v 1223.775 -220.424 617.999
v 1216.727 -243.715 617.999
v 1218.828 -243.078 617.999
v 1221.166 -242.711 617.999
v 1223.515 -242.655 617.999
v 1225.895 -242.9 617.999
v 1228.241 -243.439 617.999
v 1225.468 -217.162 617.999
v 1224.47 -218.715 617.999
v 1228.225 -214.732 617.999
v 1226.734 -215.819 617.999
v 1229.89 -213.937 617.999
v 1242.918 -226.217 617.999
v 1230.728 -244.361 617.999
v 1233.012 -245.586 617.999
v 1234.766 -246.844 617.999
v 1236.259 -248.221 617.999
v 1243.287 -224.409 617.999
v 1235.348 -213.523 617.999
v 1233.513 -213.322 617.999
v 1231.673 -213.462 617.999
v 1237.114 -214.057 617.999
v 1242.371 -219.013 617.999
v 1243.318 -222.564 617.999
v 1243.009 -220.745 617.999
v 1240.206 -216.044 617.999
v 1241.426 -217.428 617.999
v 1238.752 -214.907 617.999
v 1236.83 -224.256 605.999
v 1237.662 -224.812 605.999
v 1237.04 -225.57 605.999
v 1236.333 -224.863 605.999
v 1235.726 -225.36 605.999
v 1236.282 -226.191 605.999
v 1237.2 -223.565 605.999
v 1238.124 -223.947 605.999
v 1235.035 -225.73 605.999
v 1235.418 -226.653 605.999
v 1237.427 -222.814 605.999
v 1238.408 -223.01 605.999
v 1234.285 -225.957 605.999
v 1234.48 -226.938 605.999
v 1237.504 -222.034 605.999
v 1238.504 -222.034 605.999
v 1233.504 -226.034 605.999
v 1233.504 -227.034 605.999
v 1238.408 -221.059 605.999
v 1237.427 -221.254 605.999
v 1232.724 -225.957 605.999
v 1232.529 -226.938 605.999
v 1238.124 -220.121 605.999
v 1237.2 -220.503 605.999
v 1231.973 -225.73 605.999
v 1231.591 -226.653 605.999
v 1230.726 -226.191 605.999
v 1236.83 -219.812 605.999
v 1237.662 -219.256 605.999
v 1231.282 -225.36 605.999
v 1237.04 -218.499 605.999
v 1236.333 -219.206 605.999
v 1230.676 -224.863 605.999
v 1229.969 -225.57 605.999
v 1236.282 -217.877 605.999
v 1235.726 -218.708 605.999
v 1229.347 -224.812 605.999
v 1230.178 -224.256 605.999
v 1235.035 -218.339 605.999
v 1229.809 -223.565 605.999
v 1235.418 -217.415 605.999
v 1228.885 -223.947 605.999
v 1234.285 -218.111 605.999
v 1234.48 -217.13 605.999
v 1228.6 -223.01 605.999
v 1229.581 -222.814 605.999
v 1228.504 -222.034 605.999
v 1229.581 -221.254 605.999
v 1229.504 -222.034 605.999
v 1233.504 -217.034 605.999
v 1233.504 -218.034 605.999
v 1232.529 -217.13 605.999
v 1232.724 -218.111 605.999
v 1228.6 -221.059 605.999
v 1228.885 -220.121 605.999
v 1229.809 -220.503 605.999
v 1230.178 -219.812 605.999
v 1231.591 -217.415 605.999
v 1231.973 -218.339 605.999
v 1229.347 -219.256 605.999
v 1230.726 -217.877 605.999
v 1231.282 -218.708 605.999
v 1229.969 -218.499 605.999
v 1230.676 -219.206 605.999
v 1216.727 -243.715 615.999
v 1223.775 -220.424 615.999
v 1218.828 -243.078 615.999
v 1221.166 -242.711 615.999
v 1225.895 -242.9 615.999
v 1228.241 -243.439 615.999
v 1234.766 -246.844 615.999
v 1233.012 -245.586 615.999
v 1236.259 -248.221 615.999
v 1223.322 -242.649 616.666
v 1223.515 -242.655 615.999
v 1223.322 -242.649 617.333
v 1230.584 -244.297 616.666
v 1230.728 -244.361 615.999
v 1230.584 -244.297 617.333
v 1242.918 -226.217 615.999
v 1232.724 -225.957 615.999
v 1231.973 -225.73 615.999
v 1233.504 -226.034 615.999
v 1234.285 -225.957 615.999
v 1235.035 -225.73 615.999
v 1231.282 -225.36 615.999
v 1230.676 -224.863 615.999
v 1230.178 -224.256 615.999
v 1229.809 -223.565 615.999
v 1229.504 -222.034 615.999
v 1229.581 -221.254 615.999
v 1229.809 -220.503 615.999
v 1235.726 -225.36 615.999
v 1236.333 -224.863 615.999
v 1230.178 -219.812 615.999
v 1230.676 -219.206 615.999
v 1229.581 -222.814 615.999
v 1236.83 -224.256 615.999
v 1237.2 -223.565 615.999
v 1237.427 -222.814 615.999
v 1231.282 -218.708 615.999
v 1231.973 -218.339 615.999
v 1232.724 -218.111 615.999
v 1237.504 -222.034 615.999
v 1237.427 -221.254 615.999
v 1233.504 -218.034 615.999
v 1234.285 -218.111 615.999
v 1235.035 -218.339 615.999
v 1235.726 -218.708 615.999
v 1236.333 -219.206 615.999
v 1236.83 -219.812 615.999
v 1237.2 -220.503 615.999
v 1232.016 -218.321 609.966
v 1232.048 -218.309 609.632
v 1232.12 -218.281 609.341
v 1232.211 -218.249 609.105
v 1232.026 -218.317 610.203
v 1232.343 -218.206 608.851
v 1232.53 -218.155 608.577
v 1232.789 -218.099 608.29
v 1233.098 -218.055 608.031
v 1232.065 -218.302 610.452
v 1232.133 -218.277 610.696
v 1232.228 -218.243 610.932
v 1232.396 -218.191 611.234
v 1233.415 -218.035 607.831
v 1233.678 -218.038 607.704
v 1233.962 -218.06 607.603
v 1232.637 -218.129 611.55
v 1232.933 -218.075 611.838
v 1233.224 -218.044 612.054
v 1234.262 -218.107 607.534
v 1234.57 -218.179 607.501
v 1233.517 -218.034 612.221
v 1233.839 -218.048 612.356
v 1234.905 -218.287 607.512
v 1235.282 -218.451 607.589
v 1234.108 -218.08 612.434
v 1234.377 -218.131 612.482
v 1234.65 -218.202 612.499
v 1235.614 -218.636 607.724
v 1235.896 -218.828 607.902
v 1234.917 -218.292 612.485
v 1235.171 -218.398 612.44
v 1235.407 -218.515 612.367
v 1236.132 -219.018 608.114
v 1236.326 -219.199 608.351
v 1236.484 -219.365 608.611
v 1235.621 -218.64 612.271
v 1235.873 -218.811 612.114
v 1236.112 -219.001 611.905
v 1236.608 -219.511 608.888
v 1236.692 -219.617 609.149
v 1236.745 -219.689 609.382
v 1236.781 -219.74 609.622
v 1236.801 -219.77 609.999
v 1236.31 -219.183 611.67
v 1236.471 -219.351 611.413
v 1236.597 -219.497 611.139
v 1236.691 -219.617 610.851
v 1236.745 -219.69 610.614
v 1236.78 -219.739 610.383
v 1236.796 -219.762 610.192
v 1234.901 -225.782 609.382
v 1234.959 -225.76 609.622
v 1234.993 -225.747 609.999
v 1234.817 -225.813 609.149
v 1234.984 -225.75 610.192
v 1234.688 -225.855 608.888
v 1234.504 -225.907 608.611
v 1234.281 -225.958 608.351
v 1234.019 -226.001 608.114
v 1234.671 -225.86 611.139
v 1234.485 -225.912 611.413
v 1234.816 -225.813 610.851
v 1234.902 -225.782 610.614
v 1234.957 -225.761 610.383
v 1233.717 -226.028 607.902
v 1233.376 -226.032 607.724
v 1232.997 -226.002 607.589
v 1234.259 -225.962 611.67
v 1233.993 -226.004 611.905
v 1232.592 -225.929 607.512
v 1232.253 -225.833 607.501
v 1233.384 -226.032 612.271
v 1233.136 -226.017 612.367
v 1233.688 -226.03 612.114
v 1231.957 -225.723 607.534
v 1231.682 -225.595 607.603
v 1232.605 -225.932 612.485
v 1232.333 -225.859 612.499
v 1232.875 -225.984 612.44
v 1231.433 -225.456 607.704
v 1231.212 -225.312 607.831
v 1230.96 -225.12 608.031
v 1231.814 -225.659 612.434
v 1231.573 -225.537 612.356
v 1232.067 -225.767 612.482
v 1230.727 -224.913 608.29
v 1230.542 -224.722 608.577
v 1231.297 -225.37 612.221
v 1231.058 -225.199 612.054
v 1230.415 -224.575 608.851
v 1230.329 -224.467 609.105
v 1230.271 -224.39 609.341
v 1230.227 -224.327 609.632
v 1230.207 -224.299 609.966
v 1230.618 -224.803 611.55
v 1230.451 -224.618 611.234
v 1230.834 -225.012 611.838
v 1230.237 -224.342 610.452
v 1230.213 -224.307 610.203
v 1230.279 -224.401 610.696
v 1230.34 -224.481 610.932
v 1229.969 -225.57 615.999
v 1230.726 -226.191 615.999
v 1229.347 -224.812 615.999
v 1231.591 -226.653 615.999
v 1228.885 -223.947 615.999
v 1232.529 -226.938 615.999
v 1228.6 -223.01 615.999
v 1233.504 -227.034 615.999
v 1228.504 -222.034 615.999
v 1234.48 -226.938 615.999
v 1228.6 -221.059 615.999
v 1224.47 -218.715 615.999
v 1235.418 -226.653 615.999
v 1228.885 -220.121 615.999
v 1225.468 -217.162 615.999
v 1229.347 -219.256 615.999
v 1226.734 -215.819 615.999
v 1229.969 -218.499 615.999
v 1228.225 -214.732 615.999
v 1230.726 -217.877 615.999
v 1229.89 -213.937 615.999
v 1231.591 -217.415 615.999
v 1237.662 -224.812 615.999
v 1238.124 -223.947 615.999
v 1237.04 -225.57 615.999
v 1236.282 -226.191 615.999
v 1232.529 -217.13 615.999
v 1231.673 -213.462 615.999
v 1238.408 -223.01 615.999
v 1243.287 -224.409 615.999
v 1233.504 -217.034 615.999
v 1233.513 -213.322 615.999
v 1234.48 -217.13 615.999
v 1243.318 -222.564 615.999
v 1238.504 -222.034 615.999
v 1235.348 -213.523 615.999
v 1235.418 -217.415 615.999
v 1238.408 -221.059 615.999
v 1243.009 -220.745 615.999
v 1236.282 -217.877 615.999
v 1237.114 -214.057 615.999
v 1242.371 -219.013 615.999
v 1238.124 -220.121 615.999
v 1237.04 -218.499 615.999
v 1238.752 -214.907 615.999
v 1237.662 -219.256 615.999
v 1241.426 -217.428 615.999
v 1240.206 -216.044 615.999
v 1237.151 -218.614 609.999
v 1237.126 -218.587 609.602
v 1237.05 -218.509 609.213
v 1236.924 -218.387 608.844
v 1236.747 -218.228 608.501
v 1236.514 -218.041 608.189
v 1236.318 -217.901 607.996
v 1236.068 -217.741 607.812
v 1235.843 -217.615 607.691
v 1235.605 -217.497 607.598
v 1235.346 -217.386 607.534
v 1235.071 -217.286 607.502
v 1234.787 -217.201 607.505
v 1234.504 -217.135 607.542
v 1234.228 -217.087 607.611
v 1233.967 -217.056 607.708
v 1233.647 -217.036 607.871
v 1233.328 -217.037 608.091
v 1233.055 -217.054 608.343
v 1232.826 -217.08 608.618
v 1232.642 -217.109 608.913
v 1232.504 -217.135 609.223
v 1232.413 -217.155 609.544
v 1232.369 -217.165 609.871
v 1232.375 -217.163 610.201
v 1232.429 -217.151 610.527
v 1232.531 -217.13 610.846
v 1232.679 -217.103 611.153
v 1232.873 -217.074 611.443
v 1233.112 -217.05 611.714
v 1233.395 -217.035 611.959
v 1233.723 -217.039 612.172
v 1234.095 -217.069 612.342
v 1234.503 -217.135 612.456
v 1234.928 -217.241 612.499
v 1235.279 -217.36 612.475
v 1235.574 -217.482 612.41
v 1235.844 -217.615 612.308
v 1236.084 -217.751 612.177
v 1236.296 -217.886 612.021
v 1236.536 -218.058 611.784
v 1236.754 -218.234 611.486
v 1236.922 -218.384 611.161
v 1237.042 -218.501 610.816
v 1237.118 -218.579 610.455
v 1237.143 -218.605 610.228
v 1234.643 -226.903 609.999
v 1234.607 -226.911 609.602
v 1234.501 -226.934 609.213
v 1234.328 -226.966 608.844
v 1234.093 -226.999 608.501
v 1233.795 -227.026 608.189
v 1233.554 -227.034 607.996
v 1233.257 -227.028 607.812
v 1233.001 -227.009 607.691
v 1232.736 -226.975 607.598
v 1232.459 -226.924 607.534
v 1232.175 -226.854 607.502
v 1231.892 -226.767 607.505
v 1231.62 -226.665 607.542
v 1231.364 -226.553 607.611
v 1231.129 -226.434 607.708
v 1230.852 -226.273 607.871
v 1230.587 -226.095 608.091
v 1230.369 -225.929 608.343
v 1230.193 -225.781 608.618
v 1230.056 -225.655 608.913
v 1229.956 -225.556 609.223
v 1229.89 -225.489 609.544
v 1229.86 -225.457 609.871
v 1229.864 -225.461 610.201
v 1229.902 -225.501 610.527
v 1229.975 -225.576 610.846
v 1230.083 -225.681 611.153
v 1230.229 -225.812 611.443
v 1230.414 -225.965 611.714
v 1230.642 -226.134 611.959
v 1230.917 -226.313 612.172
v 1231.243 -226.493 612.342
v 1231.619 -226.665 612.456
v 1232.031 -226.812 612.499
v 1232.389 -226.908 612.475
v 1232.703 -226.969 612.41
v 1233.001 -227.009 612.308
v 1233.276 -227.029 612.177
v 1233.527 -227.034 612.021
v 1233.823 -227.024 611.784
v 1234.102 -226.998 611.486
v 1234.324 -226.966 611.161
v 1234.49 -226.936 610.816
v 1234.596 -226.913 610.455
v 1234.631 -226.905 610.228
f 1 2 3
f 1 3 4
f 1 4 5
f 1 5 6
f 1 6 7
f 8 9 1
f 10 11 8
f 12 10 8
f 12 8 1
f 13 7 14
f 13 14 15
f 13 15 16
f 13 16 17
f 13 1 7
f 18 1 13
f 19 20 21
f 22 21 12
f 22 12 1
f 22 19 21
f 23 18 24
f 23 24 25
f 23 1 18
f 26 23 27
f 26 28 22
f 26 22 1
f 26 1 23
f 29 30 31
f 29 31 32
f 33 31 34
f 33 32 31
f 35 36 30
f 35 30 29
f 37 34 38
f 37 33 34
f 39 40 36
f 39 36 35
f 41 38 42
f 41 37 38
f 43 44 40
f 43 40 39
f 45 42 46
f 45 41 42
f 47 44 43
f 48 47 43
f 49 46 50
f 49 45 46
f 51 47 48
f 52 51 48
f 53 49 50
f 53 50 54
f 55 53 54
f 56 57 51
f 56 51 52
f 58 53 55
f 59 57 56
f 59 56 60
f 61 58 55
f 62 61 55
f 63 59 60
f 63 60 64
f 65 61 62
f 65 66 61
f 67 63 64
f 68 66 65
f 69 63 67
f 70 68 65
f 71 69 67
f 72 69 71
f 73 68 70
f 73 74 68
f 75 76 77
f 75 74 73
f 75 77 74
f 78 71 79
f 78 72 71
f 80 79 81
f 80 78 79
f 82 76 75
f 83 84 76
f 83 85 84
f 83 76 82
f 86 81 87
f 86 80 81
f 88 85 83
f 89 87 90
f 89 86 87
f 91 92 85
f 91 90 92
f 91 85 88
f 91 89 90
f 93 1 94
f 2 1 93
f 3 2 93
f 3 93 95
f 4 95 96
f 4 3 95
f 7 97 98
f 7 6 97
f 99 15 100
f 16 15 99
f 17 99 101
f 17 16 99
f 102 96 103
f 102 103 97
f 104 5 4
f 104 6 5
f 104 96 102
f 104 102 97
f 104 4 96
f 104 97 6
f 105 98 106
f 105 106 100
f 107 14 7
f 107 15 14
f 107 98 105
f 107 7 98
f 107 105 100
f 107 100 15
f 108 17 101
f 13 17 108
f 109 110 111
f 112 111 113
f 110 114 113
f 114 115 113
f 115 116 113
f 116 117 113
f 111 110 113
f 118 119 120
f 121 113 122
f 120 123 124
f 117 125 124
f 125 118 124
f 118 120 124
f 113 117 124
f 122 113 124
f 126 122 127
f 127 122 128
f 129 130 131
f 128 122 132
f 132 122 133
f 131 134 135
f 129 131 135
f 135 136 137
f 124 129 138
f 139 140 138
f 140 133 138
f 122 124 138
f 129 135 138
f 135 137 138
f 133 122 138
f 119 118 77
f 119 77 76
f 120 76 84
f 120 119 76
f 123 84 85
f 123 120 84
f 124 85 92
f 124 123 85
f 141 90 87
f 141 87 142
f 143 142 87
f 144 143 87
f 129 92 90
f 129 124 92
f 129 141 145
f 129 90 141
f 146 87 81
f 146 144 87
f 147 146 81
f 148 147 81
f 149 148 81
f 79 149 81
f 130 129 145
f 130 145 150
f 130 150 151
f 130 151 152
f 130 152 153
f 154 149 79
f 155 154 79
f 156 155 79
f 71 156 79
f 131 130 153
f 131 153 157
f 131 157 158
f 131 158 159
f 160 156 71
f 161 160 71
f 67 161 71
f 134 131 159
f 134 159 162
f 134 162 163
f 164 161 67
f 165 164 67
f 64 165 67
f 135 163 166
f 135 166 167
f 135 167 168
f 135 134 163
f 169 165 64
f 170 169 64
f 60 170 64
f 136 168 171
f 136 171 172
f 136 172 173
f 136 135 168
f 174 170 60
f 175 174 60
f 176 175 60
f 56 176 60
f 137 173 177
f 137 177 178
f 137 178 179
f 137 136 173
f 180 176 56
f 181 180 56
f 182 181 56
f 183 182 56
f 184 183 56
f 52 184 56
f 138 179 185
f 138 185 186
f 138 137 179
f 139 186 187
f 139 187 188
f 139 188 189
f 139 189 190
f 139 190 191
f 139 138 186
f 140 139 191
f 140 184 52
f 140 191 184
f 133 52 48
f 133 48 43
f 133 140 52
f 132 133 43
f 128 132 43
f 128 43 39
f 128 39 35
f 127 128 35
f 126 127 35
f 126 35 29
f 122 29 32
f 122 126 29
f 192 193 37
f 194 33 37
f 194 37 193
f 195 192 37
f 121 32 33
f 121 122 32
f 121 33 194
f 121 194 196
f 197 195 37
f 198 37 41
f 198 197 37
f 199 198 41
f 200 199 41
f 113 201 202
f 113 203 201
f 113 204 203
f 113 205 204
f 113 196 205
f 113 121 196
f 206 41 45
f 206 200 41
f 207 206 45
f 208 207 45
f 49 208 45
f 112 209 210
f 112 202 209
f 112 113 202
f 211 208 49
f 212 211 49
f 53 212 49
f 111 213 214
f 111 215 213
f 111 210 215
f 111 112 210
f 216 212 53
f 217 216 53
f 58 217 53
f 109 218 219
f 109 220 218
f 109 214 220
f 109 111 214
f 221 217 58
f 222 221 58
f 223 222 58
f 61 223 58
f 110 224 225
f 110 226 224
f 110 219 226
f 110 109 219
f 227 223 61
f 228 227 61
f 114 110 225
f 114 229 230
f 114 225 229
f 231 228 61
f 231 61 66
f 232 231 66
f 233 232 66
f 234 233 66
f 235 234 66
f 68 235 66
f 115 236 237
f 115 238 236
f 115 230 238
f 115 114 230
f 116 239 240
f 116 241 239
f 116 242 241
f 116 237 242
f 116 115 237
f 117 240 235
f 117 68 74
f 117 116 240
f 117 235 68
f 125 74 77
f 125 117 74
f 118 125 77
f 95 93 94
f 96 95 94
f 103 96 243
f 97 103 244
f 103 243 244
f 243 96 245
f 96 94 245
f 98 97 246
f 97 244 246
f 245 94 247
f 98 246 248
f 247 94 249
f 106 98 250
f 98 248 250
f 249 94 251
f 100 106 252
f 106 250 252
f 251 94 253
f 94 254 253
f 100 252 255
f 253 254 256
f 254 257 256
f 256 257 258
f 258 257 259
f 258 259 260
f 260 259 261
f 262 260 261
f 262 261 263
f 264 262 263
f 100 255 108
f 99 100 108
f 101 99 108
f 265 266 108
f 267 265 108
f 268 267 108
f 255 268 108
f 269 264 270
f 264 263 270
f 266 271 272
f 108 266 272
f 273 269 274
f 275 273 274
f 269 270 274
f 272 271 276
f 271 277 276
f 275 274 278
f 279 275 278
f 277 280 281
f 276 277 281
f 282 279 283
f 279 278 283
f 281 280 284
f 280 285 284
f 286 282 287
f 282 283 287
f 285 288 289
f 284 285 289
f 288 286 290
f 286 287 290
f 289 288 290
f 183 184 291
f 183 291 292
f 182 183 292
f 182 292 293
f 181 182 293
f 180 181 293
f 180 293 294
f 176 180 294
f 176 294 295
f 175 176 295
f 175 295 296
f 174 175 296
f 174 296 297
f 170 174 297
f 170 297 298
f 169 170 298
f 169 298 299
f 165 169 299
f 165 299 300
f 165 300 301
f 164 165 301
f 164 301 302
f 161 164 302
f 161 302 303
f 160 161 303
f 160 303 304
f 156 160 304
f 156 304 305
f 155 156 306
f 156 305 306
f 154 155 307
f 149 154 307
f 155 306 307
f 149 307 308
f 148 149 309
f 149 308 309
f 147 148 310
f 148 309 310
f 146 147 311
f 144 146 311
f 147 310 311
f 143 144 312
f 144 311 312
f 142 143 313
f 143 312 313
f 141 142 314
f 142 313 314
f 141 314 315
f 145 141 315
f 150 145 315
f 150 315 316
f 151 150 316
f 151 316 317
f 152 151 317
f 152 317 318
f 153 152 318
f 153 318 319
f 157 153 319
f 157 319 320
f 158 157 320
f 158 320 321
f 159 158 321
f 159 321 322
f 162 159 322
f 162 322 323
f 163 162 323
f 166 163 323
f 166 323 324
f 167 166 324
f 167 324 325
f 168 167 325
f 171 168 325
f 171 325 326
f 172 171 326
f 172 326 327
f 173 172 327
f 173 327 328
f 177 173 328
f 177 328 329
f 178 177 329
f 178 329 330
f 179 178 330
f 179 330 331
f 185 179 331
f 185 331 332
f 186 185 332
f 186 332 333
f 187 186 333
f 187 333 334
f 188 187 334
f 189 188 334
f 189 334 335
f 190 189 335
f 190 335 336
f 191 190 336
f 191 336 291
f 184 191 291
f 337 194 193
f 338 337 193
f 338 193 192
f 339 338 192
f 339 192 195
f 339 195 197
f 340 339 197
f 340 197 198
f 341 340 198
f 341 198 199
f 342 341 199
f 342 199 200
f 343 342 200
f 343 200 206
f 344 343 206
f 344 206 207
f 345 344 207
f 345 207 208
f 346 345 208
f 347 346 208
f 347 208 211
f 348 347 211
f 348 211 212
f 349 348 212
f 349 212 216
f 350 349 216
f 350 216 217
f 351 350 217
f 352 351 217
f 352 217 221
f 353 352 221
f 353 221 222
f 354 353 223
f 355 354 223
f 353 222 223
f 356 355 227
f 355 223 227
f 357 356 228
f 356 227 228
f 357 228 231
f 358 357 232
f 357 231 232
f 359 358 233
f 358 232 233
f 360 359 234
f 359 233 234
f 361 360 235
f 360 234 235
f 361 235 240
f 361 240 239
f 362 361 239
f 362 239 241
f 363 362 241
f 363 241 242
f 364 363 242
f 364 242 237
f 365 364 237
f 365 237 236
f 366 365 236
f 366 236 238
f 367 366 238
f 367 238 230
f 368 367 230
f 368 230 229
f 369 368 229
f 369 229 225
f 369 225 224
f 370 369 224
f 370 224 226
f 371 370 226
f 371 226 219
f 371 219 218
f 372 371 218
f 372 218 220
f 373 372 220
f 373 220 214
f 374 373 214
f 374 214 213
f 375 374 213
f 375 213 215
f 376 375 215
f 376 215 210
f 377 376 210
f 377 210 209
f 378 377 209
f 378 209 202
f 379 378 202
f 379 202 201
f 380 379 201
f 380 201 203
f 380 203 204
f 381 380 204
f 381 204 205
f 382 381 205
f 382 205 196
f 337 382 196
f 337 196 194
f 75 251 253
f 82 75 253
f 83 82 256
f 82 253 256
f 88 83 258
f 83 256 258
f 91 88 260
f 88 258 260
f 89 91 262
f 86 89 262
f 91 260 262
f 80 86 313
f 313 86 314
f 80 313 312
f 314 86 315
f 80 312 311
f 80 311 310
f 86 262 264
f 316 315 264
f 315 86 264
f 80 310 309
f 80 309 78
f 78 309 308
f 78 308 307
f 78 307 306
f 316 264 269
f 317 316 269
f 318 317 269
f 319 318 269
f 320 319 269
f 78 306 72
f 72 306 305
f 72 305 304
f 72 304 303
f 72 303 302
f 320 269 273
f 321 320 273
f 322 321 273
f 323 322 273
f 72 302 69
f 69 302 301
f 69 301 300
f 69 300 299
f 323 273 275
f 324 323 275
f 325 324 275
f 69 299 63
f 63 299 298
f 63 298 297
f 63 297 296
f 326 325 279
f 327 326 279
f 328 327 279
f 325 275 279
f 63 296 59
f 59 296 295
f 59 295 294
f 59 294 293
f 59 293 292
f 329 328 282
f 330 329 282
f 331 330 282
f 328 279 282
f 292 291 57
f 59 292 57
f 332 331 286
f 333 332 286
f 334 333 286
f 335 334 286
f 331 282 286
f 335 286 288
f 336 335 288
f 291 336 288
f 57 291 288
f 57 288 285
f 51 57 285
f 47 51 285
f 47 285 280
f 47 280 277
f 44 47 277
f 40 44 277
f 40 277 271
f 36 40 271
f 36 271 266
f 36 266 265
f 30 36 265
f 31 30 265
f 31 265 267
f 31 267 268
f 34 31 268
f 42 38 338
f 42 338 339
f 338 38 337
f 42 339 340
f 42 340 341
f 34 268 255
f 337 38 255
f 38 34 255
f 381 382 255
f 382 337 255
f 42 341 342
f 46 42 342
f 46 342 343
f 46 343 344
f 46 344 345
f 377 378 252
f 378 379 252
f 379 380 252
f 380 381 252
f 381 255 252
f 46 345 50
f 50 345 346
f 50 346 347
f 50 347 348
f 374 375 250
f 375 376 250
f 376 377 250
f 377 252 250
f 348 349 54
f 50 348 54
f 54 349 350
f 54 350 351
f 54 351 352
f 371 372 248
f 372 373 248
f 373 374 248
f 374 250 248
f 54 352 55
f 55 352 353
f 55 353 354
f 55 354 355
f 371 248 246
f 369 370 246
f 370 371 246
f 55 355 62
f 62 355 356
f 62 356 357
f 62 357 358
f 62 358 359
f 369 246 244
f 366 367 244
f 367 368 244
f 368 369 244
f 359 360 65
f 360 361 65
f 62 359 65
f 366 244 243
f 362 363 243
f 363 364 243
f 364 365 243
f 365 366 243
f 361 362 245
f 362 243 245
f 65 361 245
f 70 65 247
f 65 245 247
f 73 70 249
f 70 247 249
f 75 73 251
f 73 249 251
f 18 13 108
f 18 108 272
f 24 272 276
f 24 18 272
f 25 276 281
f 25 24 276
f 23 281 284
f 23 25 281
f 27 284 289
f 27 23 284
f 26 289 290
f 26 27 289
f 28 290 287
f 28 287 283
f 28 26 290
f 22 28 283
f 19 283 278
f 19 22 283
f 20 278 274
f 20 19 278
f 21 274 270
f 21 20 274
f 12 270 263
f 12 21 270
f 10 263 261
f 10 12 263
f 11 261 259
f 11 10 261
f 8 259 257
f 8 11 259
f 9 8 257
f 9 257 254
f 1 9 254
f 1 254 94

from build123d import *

# Parameters (mm, degrees)
DODANIE_WYCI_GNI_CIE1_DEPTH = 2
SZKIC8_R                    = 5
SZKIC8_R_2                  = 4
EXTRUDE_THIN1_DEPTH         = 10
SKETCH1_R                   = 2.5
CUT_EXTRUDE1_DEPTH          = 20


with BuildPart() as part:
    # Szkic7 → Dodanie-wyciągnięcie1 (new body)
    with BuildSketch(Plane(origin=(0, 0, 617.999346089), x_dir=(-1, 0, 0), z_dir=(0, 0, -1))):
        with BuildLine():
            Line((-1236.2588409, -248.22109889), (-1242.917839996, -226.217062929))
            ThreePointArc((-1242.917839996, -226.217062929), (-1236.243055057, -213.749214437), (-1223.775206565, -220.423999377))
            Line((-1223.775206565, -220.423999377), (-1216.726590952, -243.715486458))
            add(Edge.make_bspline(
                [(-1216.726590952, -243.715486458), (-1223.443292113, -241.147709702), (-1231.151179112, -242.879902365), (-1236.2588409, -248.22109889)],
                knots=[0.154038794, 0.154038794, 0.154038794, 0.154038794, 0.334986093, 0.334986093, 0.334986093, 0.334986093], degree=3, weights=[0.573668424, 0.481060845, 0.475765067, 0.557781088]))
        make_face()
    extrude(amount=DODANIE_WYCI_GNI_CIE1_DEPTH)

    # Szkic8 → Extrude-Thin1 (add)
    with BuildSketch(Plane(origin=(0, 0, 615.999346089), x_dir=(-1, 0, 0), z_dir=(0, 0, -1))):
        with Locations((-1233.504191335, -222.034079566)):
            Circle(SZKIC8_R)
        with Locations((-1233.504191335, -222.034079566)):
            Circle(SZKIC8_R_2, mode=Mode.SUBTRACT)
    extrude(amount=EXTRUDE_THIN1_DEPTH)

    # Sketch1 → Cut-Extrude1 (cut)
    with BuildSketch(Plane(origin=(43.382097596, 143.352059634, 0), x_dir=(0.9571316715628467, -0.28965317759574266, 0), z_dir=(0.28965317759574266, 0.9571316715628467, 0))):
        with Locations((1244.938805213, -609.999346089)):
            Circle(SKETCH1_R)
    extrude(amount=-CUT_EXTRUDE1_DEPTH, mode=Mode.SUBTRACT)


solid = part.part
